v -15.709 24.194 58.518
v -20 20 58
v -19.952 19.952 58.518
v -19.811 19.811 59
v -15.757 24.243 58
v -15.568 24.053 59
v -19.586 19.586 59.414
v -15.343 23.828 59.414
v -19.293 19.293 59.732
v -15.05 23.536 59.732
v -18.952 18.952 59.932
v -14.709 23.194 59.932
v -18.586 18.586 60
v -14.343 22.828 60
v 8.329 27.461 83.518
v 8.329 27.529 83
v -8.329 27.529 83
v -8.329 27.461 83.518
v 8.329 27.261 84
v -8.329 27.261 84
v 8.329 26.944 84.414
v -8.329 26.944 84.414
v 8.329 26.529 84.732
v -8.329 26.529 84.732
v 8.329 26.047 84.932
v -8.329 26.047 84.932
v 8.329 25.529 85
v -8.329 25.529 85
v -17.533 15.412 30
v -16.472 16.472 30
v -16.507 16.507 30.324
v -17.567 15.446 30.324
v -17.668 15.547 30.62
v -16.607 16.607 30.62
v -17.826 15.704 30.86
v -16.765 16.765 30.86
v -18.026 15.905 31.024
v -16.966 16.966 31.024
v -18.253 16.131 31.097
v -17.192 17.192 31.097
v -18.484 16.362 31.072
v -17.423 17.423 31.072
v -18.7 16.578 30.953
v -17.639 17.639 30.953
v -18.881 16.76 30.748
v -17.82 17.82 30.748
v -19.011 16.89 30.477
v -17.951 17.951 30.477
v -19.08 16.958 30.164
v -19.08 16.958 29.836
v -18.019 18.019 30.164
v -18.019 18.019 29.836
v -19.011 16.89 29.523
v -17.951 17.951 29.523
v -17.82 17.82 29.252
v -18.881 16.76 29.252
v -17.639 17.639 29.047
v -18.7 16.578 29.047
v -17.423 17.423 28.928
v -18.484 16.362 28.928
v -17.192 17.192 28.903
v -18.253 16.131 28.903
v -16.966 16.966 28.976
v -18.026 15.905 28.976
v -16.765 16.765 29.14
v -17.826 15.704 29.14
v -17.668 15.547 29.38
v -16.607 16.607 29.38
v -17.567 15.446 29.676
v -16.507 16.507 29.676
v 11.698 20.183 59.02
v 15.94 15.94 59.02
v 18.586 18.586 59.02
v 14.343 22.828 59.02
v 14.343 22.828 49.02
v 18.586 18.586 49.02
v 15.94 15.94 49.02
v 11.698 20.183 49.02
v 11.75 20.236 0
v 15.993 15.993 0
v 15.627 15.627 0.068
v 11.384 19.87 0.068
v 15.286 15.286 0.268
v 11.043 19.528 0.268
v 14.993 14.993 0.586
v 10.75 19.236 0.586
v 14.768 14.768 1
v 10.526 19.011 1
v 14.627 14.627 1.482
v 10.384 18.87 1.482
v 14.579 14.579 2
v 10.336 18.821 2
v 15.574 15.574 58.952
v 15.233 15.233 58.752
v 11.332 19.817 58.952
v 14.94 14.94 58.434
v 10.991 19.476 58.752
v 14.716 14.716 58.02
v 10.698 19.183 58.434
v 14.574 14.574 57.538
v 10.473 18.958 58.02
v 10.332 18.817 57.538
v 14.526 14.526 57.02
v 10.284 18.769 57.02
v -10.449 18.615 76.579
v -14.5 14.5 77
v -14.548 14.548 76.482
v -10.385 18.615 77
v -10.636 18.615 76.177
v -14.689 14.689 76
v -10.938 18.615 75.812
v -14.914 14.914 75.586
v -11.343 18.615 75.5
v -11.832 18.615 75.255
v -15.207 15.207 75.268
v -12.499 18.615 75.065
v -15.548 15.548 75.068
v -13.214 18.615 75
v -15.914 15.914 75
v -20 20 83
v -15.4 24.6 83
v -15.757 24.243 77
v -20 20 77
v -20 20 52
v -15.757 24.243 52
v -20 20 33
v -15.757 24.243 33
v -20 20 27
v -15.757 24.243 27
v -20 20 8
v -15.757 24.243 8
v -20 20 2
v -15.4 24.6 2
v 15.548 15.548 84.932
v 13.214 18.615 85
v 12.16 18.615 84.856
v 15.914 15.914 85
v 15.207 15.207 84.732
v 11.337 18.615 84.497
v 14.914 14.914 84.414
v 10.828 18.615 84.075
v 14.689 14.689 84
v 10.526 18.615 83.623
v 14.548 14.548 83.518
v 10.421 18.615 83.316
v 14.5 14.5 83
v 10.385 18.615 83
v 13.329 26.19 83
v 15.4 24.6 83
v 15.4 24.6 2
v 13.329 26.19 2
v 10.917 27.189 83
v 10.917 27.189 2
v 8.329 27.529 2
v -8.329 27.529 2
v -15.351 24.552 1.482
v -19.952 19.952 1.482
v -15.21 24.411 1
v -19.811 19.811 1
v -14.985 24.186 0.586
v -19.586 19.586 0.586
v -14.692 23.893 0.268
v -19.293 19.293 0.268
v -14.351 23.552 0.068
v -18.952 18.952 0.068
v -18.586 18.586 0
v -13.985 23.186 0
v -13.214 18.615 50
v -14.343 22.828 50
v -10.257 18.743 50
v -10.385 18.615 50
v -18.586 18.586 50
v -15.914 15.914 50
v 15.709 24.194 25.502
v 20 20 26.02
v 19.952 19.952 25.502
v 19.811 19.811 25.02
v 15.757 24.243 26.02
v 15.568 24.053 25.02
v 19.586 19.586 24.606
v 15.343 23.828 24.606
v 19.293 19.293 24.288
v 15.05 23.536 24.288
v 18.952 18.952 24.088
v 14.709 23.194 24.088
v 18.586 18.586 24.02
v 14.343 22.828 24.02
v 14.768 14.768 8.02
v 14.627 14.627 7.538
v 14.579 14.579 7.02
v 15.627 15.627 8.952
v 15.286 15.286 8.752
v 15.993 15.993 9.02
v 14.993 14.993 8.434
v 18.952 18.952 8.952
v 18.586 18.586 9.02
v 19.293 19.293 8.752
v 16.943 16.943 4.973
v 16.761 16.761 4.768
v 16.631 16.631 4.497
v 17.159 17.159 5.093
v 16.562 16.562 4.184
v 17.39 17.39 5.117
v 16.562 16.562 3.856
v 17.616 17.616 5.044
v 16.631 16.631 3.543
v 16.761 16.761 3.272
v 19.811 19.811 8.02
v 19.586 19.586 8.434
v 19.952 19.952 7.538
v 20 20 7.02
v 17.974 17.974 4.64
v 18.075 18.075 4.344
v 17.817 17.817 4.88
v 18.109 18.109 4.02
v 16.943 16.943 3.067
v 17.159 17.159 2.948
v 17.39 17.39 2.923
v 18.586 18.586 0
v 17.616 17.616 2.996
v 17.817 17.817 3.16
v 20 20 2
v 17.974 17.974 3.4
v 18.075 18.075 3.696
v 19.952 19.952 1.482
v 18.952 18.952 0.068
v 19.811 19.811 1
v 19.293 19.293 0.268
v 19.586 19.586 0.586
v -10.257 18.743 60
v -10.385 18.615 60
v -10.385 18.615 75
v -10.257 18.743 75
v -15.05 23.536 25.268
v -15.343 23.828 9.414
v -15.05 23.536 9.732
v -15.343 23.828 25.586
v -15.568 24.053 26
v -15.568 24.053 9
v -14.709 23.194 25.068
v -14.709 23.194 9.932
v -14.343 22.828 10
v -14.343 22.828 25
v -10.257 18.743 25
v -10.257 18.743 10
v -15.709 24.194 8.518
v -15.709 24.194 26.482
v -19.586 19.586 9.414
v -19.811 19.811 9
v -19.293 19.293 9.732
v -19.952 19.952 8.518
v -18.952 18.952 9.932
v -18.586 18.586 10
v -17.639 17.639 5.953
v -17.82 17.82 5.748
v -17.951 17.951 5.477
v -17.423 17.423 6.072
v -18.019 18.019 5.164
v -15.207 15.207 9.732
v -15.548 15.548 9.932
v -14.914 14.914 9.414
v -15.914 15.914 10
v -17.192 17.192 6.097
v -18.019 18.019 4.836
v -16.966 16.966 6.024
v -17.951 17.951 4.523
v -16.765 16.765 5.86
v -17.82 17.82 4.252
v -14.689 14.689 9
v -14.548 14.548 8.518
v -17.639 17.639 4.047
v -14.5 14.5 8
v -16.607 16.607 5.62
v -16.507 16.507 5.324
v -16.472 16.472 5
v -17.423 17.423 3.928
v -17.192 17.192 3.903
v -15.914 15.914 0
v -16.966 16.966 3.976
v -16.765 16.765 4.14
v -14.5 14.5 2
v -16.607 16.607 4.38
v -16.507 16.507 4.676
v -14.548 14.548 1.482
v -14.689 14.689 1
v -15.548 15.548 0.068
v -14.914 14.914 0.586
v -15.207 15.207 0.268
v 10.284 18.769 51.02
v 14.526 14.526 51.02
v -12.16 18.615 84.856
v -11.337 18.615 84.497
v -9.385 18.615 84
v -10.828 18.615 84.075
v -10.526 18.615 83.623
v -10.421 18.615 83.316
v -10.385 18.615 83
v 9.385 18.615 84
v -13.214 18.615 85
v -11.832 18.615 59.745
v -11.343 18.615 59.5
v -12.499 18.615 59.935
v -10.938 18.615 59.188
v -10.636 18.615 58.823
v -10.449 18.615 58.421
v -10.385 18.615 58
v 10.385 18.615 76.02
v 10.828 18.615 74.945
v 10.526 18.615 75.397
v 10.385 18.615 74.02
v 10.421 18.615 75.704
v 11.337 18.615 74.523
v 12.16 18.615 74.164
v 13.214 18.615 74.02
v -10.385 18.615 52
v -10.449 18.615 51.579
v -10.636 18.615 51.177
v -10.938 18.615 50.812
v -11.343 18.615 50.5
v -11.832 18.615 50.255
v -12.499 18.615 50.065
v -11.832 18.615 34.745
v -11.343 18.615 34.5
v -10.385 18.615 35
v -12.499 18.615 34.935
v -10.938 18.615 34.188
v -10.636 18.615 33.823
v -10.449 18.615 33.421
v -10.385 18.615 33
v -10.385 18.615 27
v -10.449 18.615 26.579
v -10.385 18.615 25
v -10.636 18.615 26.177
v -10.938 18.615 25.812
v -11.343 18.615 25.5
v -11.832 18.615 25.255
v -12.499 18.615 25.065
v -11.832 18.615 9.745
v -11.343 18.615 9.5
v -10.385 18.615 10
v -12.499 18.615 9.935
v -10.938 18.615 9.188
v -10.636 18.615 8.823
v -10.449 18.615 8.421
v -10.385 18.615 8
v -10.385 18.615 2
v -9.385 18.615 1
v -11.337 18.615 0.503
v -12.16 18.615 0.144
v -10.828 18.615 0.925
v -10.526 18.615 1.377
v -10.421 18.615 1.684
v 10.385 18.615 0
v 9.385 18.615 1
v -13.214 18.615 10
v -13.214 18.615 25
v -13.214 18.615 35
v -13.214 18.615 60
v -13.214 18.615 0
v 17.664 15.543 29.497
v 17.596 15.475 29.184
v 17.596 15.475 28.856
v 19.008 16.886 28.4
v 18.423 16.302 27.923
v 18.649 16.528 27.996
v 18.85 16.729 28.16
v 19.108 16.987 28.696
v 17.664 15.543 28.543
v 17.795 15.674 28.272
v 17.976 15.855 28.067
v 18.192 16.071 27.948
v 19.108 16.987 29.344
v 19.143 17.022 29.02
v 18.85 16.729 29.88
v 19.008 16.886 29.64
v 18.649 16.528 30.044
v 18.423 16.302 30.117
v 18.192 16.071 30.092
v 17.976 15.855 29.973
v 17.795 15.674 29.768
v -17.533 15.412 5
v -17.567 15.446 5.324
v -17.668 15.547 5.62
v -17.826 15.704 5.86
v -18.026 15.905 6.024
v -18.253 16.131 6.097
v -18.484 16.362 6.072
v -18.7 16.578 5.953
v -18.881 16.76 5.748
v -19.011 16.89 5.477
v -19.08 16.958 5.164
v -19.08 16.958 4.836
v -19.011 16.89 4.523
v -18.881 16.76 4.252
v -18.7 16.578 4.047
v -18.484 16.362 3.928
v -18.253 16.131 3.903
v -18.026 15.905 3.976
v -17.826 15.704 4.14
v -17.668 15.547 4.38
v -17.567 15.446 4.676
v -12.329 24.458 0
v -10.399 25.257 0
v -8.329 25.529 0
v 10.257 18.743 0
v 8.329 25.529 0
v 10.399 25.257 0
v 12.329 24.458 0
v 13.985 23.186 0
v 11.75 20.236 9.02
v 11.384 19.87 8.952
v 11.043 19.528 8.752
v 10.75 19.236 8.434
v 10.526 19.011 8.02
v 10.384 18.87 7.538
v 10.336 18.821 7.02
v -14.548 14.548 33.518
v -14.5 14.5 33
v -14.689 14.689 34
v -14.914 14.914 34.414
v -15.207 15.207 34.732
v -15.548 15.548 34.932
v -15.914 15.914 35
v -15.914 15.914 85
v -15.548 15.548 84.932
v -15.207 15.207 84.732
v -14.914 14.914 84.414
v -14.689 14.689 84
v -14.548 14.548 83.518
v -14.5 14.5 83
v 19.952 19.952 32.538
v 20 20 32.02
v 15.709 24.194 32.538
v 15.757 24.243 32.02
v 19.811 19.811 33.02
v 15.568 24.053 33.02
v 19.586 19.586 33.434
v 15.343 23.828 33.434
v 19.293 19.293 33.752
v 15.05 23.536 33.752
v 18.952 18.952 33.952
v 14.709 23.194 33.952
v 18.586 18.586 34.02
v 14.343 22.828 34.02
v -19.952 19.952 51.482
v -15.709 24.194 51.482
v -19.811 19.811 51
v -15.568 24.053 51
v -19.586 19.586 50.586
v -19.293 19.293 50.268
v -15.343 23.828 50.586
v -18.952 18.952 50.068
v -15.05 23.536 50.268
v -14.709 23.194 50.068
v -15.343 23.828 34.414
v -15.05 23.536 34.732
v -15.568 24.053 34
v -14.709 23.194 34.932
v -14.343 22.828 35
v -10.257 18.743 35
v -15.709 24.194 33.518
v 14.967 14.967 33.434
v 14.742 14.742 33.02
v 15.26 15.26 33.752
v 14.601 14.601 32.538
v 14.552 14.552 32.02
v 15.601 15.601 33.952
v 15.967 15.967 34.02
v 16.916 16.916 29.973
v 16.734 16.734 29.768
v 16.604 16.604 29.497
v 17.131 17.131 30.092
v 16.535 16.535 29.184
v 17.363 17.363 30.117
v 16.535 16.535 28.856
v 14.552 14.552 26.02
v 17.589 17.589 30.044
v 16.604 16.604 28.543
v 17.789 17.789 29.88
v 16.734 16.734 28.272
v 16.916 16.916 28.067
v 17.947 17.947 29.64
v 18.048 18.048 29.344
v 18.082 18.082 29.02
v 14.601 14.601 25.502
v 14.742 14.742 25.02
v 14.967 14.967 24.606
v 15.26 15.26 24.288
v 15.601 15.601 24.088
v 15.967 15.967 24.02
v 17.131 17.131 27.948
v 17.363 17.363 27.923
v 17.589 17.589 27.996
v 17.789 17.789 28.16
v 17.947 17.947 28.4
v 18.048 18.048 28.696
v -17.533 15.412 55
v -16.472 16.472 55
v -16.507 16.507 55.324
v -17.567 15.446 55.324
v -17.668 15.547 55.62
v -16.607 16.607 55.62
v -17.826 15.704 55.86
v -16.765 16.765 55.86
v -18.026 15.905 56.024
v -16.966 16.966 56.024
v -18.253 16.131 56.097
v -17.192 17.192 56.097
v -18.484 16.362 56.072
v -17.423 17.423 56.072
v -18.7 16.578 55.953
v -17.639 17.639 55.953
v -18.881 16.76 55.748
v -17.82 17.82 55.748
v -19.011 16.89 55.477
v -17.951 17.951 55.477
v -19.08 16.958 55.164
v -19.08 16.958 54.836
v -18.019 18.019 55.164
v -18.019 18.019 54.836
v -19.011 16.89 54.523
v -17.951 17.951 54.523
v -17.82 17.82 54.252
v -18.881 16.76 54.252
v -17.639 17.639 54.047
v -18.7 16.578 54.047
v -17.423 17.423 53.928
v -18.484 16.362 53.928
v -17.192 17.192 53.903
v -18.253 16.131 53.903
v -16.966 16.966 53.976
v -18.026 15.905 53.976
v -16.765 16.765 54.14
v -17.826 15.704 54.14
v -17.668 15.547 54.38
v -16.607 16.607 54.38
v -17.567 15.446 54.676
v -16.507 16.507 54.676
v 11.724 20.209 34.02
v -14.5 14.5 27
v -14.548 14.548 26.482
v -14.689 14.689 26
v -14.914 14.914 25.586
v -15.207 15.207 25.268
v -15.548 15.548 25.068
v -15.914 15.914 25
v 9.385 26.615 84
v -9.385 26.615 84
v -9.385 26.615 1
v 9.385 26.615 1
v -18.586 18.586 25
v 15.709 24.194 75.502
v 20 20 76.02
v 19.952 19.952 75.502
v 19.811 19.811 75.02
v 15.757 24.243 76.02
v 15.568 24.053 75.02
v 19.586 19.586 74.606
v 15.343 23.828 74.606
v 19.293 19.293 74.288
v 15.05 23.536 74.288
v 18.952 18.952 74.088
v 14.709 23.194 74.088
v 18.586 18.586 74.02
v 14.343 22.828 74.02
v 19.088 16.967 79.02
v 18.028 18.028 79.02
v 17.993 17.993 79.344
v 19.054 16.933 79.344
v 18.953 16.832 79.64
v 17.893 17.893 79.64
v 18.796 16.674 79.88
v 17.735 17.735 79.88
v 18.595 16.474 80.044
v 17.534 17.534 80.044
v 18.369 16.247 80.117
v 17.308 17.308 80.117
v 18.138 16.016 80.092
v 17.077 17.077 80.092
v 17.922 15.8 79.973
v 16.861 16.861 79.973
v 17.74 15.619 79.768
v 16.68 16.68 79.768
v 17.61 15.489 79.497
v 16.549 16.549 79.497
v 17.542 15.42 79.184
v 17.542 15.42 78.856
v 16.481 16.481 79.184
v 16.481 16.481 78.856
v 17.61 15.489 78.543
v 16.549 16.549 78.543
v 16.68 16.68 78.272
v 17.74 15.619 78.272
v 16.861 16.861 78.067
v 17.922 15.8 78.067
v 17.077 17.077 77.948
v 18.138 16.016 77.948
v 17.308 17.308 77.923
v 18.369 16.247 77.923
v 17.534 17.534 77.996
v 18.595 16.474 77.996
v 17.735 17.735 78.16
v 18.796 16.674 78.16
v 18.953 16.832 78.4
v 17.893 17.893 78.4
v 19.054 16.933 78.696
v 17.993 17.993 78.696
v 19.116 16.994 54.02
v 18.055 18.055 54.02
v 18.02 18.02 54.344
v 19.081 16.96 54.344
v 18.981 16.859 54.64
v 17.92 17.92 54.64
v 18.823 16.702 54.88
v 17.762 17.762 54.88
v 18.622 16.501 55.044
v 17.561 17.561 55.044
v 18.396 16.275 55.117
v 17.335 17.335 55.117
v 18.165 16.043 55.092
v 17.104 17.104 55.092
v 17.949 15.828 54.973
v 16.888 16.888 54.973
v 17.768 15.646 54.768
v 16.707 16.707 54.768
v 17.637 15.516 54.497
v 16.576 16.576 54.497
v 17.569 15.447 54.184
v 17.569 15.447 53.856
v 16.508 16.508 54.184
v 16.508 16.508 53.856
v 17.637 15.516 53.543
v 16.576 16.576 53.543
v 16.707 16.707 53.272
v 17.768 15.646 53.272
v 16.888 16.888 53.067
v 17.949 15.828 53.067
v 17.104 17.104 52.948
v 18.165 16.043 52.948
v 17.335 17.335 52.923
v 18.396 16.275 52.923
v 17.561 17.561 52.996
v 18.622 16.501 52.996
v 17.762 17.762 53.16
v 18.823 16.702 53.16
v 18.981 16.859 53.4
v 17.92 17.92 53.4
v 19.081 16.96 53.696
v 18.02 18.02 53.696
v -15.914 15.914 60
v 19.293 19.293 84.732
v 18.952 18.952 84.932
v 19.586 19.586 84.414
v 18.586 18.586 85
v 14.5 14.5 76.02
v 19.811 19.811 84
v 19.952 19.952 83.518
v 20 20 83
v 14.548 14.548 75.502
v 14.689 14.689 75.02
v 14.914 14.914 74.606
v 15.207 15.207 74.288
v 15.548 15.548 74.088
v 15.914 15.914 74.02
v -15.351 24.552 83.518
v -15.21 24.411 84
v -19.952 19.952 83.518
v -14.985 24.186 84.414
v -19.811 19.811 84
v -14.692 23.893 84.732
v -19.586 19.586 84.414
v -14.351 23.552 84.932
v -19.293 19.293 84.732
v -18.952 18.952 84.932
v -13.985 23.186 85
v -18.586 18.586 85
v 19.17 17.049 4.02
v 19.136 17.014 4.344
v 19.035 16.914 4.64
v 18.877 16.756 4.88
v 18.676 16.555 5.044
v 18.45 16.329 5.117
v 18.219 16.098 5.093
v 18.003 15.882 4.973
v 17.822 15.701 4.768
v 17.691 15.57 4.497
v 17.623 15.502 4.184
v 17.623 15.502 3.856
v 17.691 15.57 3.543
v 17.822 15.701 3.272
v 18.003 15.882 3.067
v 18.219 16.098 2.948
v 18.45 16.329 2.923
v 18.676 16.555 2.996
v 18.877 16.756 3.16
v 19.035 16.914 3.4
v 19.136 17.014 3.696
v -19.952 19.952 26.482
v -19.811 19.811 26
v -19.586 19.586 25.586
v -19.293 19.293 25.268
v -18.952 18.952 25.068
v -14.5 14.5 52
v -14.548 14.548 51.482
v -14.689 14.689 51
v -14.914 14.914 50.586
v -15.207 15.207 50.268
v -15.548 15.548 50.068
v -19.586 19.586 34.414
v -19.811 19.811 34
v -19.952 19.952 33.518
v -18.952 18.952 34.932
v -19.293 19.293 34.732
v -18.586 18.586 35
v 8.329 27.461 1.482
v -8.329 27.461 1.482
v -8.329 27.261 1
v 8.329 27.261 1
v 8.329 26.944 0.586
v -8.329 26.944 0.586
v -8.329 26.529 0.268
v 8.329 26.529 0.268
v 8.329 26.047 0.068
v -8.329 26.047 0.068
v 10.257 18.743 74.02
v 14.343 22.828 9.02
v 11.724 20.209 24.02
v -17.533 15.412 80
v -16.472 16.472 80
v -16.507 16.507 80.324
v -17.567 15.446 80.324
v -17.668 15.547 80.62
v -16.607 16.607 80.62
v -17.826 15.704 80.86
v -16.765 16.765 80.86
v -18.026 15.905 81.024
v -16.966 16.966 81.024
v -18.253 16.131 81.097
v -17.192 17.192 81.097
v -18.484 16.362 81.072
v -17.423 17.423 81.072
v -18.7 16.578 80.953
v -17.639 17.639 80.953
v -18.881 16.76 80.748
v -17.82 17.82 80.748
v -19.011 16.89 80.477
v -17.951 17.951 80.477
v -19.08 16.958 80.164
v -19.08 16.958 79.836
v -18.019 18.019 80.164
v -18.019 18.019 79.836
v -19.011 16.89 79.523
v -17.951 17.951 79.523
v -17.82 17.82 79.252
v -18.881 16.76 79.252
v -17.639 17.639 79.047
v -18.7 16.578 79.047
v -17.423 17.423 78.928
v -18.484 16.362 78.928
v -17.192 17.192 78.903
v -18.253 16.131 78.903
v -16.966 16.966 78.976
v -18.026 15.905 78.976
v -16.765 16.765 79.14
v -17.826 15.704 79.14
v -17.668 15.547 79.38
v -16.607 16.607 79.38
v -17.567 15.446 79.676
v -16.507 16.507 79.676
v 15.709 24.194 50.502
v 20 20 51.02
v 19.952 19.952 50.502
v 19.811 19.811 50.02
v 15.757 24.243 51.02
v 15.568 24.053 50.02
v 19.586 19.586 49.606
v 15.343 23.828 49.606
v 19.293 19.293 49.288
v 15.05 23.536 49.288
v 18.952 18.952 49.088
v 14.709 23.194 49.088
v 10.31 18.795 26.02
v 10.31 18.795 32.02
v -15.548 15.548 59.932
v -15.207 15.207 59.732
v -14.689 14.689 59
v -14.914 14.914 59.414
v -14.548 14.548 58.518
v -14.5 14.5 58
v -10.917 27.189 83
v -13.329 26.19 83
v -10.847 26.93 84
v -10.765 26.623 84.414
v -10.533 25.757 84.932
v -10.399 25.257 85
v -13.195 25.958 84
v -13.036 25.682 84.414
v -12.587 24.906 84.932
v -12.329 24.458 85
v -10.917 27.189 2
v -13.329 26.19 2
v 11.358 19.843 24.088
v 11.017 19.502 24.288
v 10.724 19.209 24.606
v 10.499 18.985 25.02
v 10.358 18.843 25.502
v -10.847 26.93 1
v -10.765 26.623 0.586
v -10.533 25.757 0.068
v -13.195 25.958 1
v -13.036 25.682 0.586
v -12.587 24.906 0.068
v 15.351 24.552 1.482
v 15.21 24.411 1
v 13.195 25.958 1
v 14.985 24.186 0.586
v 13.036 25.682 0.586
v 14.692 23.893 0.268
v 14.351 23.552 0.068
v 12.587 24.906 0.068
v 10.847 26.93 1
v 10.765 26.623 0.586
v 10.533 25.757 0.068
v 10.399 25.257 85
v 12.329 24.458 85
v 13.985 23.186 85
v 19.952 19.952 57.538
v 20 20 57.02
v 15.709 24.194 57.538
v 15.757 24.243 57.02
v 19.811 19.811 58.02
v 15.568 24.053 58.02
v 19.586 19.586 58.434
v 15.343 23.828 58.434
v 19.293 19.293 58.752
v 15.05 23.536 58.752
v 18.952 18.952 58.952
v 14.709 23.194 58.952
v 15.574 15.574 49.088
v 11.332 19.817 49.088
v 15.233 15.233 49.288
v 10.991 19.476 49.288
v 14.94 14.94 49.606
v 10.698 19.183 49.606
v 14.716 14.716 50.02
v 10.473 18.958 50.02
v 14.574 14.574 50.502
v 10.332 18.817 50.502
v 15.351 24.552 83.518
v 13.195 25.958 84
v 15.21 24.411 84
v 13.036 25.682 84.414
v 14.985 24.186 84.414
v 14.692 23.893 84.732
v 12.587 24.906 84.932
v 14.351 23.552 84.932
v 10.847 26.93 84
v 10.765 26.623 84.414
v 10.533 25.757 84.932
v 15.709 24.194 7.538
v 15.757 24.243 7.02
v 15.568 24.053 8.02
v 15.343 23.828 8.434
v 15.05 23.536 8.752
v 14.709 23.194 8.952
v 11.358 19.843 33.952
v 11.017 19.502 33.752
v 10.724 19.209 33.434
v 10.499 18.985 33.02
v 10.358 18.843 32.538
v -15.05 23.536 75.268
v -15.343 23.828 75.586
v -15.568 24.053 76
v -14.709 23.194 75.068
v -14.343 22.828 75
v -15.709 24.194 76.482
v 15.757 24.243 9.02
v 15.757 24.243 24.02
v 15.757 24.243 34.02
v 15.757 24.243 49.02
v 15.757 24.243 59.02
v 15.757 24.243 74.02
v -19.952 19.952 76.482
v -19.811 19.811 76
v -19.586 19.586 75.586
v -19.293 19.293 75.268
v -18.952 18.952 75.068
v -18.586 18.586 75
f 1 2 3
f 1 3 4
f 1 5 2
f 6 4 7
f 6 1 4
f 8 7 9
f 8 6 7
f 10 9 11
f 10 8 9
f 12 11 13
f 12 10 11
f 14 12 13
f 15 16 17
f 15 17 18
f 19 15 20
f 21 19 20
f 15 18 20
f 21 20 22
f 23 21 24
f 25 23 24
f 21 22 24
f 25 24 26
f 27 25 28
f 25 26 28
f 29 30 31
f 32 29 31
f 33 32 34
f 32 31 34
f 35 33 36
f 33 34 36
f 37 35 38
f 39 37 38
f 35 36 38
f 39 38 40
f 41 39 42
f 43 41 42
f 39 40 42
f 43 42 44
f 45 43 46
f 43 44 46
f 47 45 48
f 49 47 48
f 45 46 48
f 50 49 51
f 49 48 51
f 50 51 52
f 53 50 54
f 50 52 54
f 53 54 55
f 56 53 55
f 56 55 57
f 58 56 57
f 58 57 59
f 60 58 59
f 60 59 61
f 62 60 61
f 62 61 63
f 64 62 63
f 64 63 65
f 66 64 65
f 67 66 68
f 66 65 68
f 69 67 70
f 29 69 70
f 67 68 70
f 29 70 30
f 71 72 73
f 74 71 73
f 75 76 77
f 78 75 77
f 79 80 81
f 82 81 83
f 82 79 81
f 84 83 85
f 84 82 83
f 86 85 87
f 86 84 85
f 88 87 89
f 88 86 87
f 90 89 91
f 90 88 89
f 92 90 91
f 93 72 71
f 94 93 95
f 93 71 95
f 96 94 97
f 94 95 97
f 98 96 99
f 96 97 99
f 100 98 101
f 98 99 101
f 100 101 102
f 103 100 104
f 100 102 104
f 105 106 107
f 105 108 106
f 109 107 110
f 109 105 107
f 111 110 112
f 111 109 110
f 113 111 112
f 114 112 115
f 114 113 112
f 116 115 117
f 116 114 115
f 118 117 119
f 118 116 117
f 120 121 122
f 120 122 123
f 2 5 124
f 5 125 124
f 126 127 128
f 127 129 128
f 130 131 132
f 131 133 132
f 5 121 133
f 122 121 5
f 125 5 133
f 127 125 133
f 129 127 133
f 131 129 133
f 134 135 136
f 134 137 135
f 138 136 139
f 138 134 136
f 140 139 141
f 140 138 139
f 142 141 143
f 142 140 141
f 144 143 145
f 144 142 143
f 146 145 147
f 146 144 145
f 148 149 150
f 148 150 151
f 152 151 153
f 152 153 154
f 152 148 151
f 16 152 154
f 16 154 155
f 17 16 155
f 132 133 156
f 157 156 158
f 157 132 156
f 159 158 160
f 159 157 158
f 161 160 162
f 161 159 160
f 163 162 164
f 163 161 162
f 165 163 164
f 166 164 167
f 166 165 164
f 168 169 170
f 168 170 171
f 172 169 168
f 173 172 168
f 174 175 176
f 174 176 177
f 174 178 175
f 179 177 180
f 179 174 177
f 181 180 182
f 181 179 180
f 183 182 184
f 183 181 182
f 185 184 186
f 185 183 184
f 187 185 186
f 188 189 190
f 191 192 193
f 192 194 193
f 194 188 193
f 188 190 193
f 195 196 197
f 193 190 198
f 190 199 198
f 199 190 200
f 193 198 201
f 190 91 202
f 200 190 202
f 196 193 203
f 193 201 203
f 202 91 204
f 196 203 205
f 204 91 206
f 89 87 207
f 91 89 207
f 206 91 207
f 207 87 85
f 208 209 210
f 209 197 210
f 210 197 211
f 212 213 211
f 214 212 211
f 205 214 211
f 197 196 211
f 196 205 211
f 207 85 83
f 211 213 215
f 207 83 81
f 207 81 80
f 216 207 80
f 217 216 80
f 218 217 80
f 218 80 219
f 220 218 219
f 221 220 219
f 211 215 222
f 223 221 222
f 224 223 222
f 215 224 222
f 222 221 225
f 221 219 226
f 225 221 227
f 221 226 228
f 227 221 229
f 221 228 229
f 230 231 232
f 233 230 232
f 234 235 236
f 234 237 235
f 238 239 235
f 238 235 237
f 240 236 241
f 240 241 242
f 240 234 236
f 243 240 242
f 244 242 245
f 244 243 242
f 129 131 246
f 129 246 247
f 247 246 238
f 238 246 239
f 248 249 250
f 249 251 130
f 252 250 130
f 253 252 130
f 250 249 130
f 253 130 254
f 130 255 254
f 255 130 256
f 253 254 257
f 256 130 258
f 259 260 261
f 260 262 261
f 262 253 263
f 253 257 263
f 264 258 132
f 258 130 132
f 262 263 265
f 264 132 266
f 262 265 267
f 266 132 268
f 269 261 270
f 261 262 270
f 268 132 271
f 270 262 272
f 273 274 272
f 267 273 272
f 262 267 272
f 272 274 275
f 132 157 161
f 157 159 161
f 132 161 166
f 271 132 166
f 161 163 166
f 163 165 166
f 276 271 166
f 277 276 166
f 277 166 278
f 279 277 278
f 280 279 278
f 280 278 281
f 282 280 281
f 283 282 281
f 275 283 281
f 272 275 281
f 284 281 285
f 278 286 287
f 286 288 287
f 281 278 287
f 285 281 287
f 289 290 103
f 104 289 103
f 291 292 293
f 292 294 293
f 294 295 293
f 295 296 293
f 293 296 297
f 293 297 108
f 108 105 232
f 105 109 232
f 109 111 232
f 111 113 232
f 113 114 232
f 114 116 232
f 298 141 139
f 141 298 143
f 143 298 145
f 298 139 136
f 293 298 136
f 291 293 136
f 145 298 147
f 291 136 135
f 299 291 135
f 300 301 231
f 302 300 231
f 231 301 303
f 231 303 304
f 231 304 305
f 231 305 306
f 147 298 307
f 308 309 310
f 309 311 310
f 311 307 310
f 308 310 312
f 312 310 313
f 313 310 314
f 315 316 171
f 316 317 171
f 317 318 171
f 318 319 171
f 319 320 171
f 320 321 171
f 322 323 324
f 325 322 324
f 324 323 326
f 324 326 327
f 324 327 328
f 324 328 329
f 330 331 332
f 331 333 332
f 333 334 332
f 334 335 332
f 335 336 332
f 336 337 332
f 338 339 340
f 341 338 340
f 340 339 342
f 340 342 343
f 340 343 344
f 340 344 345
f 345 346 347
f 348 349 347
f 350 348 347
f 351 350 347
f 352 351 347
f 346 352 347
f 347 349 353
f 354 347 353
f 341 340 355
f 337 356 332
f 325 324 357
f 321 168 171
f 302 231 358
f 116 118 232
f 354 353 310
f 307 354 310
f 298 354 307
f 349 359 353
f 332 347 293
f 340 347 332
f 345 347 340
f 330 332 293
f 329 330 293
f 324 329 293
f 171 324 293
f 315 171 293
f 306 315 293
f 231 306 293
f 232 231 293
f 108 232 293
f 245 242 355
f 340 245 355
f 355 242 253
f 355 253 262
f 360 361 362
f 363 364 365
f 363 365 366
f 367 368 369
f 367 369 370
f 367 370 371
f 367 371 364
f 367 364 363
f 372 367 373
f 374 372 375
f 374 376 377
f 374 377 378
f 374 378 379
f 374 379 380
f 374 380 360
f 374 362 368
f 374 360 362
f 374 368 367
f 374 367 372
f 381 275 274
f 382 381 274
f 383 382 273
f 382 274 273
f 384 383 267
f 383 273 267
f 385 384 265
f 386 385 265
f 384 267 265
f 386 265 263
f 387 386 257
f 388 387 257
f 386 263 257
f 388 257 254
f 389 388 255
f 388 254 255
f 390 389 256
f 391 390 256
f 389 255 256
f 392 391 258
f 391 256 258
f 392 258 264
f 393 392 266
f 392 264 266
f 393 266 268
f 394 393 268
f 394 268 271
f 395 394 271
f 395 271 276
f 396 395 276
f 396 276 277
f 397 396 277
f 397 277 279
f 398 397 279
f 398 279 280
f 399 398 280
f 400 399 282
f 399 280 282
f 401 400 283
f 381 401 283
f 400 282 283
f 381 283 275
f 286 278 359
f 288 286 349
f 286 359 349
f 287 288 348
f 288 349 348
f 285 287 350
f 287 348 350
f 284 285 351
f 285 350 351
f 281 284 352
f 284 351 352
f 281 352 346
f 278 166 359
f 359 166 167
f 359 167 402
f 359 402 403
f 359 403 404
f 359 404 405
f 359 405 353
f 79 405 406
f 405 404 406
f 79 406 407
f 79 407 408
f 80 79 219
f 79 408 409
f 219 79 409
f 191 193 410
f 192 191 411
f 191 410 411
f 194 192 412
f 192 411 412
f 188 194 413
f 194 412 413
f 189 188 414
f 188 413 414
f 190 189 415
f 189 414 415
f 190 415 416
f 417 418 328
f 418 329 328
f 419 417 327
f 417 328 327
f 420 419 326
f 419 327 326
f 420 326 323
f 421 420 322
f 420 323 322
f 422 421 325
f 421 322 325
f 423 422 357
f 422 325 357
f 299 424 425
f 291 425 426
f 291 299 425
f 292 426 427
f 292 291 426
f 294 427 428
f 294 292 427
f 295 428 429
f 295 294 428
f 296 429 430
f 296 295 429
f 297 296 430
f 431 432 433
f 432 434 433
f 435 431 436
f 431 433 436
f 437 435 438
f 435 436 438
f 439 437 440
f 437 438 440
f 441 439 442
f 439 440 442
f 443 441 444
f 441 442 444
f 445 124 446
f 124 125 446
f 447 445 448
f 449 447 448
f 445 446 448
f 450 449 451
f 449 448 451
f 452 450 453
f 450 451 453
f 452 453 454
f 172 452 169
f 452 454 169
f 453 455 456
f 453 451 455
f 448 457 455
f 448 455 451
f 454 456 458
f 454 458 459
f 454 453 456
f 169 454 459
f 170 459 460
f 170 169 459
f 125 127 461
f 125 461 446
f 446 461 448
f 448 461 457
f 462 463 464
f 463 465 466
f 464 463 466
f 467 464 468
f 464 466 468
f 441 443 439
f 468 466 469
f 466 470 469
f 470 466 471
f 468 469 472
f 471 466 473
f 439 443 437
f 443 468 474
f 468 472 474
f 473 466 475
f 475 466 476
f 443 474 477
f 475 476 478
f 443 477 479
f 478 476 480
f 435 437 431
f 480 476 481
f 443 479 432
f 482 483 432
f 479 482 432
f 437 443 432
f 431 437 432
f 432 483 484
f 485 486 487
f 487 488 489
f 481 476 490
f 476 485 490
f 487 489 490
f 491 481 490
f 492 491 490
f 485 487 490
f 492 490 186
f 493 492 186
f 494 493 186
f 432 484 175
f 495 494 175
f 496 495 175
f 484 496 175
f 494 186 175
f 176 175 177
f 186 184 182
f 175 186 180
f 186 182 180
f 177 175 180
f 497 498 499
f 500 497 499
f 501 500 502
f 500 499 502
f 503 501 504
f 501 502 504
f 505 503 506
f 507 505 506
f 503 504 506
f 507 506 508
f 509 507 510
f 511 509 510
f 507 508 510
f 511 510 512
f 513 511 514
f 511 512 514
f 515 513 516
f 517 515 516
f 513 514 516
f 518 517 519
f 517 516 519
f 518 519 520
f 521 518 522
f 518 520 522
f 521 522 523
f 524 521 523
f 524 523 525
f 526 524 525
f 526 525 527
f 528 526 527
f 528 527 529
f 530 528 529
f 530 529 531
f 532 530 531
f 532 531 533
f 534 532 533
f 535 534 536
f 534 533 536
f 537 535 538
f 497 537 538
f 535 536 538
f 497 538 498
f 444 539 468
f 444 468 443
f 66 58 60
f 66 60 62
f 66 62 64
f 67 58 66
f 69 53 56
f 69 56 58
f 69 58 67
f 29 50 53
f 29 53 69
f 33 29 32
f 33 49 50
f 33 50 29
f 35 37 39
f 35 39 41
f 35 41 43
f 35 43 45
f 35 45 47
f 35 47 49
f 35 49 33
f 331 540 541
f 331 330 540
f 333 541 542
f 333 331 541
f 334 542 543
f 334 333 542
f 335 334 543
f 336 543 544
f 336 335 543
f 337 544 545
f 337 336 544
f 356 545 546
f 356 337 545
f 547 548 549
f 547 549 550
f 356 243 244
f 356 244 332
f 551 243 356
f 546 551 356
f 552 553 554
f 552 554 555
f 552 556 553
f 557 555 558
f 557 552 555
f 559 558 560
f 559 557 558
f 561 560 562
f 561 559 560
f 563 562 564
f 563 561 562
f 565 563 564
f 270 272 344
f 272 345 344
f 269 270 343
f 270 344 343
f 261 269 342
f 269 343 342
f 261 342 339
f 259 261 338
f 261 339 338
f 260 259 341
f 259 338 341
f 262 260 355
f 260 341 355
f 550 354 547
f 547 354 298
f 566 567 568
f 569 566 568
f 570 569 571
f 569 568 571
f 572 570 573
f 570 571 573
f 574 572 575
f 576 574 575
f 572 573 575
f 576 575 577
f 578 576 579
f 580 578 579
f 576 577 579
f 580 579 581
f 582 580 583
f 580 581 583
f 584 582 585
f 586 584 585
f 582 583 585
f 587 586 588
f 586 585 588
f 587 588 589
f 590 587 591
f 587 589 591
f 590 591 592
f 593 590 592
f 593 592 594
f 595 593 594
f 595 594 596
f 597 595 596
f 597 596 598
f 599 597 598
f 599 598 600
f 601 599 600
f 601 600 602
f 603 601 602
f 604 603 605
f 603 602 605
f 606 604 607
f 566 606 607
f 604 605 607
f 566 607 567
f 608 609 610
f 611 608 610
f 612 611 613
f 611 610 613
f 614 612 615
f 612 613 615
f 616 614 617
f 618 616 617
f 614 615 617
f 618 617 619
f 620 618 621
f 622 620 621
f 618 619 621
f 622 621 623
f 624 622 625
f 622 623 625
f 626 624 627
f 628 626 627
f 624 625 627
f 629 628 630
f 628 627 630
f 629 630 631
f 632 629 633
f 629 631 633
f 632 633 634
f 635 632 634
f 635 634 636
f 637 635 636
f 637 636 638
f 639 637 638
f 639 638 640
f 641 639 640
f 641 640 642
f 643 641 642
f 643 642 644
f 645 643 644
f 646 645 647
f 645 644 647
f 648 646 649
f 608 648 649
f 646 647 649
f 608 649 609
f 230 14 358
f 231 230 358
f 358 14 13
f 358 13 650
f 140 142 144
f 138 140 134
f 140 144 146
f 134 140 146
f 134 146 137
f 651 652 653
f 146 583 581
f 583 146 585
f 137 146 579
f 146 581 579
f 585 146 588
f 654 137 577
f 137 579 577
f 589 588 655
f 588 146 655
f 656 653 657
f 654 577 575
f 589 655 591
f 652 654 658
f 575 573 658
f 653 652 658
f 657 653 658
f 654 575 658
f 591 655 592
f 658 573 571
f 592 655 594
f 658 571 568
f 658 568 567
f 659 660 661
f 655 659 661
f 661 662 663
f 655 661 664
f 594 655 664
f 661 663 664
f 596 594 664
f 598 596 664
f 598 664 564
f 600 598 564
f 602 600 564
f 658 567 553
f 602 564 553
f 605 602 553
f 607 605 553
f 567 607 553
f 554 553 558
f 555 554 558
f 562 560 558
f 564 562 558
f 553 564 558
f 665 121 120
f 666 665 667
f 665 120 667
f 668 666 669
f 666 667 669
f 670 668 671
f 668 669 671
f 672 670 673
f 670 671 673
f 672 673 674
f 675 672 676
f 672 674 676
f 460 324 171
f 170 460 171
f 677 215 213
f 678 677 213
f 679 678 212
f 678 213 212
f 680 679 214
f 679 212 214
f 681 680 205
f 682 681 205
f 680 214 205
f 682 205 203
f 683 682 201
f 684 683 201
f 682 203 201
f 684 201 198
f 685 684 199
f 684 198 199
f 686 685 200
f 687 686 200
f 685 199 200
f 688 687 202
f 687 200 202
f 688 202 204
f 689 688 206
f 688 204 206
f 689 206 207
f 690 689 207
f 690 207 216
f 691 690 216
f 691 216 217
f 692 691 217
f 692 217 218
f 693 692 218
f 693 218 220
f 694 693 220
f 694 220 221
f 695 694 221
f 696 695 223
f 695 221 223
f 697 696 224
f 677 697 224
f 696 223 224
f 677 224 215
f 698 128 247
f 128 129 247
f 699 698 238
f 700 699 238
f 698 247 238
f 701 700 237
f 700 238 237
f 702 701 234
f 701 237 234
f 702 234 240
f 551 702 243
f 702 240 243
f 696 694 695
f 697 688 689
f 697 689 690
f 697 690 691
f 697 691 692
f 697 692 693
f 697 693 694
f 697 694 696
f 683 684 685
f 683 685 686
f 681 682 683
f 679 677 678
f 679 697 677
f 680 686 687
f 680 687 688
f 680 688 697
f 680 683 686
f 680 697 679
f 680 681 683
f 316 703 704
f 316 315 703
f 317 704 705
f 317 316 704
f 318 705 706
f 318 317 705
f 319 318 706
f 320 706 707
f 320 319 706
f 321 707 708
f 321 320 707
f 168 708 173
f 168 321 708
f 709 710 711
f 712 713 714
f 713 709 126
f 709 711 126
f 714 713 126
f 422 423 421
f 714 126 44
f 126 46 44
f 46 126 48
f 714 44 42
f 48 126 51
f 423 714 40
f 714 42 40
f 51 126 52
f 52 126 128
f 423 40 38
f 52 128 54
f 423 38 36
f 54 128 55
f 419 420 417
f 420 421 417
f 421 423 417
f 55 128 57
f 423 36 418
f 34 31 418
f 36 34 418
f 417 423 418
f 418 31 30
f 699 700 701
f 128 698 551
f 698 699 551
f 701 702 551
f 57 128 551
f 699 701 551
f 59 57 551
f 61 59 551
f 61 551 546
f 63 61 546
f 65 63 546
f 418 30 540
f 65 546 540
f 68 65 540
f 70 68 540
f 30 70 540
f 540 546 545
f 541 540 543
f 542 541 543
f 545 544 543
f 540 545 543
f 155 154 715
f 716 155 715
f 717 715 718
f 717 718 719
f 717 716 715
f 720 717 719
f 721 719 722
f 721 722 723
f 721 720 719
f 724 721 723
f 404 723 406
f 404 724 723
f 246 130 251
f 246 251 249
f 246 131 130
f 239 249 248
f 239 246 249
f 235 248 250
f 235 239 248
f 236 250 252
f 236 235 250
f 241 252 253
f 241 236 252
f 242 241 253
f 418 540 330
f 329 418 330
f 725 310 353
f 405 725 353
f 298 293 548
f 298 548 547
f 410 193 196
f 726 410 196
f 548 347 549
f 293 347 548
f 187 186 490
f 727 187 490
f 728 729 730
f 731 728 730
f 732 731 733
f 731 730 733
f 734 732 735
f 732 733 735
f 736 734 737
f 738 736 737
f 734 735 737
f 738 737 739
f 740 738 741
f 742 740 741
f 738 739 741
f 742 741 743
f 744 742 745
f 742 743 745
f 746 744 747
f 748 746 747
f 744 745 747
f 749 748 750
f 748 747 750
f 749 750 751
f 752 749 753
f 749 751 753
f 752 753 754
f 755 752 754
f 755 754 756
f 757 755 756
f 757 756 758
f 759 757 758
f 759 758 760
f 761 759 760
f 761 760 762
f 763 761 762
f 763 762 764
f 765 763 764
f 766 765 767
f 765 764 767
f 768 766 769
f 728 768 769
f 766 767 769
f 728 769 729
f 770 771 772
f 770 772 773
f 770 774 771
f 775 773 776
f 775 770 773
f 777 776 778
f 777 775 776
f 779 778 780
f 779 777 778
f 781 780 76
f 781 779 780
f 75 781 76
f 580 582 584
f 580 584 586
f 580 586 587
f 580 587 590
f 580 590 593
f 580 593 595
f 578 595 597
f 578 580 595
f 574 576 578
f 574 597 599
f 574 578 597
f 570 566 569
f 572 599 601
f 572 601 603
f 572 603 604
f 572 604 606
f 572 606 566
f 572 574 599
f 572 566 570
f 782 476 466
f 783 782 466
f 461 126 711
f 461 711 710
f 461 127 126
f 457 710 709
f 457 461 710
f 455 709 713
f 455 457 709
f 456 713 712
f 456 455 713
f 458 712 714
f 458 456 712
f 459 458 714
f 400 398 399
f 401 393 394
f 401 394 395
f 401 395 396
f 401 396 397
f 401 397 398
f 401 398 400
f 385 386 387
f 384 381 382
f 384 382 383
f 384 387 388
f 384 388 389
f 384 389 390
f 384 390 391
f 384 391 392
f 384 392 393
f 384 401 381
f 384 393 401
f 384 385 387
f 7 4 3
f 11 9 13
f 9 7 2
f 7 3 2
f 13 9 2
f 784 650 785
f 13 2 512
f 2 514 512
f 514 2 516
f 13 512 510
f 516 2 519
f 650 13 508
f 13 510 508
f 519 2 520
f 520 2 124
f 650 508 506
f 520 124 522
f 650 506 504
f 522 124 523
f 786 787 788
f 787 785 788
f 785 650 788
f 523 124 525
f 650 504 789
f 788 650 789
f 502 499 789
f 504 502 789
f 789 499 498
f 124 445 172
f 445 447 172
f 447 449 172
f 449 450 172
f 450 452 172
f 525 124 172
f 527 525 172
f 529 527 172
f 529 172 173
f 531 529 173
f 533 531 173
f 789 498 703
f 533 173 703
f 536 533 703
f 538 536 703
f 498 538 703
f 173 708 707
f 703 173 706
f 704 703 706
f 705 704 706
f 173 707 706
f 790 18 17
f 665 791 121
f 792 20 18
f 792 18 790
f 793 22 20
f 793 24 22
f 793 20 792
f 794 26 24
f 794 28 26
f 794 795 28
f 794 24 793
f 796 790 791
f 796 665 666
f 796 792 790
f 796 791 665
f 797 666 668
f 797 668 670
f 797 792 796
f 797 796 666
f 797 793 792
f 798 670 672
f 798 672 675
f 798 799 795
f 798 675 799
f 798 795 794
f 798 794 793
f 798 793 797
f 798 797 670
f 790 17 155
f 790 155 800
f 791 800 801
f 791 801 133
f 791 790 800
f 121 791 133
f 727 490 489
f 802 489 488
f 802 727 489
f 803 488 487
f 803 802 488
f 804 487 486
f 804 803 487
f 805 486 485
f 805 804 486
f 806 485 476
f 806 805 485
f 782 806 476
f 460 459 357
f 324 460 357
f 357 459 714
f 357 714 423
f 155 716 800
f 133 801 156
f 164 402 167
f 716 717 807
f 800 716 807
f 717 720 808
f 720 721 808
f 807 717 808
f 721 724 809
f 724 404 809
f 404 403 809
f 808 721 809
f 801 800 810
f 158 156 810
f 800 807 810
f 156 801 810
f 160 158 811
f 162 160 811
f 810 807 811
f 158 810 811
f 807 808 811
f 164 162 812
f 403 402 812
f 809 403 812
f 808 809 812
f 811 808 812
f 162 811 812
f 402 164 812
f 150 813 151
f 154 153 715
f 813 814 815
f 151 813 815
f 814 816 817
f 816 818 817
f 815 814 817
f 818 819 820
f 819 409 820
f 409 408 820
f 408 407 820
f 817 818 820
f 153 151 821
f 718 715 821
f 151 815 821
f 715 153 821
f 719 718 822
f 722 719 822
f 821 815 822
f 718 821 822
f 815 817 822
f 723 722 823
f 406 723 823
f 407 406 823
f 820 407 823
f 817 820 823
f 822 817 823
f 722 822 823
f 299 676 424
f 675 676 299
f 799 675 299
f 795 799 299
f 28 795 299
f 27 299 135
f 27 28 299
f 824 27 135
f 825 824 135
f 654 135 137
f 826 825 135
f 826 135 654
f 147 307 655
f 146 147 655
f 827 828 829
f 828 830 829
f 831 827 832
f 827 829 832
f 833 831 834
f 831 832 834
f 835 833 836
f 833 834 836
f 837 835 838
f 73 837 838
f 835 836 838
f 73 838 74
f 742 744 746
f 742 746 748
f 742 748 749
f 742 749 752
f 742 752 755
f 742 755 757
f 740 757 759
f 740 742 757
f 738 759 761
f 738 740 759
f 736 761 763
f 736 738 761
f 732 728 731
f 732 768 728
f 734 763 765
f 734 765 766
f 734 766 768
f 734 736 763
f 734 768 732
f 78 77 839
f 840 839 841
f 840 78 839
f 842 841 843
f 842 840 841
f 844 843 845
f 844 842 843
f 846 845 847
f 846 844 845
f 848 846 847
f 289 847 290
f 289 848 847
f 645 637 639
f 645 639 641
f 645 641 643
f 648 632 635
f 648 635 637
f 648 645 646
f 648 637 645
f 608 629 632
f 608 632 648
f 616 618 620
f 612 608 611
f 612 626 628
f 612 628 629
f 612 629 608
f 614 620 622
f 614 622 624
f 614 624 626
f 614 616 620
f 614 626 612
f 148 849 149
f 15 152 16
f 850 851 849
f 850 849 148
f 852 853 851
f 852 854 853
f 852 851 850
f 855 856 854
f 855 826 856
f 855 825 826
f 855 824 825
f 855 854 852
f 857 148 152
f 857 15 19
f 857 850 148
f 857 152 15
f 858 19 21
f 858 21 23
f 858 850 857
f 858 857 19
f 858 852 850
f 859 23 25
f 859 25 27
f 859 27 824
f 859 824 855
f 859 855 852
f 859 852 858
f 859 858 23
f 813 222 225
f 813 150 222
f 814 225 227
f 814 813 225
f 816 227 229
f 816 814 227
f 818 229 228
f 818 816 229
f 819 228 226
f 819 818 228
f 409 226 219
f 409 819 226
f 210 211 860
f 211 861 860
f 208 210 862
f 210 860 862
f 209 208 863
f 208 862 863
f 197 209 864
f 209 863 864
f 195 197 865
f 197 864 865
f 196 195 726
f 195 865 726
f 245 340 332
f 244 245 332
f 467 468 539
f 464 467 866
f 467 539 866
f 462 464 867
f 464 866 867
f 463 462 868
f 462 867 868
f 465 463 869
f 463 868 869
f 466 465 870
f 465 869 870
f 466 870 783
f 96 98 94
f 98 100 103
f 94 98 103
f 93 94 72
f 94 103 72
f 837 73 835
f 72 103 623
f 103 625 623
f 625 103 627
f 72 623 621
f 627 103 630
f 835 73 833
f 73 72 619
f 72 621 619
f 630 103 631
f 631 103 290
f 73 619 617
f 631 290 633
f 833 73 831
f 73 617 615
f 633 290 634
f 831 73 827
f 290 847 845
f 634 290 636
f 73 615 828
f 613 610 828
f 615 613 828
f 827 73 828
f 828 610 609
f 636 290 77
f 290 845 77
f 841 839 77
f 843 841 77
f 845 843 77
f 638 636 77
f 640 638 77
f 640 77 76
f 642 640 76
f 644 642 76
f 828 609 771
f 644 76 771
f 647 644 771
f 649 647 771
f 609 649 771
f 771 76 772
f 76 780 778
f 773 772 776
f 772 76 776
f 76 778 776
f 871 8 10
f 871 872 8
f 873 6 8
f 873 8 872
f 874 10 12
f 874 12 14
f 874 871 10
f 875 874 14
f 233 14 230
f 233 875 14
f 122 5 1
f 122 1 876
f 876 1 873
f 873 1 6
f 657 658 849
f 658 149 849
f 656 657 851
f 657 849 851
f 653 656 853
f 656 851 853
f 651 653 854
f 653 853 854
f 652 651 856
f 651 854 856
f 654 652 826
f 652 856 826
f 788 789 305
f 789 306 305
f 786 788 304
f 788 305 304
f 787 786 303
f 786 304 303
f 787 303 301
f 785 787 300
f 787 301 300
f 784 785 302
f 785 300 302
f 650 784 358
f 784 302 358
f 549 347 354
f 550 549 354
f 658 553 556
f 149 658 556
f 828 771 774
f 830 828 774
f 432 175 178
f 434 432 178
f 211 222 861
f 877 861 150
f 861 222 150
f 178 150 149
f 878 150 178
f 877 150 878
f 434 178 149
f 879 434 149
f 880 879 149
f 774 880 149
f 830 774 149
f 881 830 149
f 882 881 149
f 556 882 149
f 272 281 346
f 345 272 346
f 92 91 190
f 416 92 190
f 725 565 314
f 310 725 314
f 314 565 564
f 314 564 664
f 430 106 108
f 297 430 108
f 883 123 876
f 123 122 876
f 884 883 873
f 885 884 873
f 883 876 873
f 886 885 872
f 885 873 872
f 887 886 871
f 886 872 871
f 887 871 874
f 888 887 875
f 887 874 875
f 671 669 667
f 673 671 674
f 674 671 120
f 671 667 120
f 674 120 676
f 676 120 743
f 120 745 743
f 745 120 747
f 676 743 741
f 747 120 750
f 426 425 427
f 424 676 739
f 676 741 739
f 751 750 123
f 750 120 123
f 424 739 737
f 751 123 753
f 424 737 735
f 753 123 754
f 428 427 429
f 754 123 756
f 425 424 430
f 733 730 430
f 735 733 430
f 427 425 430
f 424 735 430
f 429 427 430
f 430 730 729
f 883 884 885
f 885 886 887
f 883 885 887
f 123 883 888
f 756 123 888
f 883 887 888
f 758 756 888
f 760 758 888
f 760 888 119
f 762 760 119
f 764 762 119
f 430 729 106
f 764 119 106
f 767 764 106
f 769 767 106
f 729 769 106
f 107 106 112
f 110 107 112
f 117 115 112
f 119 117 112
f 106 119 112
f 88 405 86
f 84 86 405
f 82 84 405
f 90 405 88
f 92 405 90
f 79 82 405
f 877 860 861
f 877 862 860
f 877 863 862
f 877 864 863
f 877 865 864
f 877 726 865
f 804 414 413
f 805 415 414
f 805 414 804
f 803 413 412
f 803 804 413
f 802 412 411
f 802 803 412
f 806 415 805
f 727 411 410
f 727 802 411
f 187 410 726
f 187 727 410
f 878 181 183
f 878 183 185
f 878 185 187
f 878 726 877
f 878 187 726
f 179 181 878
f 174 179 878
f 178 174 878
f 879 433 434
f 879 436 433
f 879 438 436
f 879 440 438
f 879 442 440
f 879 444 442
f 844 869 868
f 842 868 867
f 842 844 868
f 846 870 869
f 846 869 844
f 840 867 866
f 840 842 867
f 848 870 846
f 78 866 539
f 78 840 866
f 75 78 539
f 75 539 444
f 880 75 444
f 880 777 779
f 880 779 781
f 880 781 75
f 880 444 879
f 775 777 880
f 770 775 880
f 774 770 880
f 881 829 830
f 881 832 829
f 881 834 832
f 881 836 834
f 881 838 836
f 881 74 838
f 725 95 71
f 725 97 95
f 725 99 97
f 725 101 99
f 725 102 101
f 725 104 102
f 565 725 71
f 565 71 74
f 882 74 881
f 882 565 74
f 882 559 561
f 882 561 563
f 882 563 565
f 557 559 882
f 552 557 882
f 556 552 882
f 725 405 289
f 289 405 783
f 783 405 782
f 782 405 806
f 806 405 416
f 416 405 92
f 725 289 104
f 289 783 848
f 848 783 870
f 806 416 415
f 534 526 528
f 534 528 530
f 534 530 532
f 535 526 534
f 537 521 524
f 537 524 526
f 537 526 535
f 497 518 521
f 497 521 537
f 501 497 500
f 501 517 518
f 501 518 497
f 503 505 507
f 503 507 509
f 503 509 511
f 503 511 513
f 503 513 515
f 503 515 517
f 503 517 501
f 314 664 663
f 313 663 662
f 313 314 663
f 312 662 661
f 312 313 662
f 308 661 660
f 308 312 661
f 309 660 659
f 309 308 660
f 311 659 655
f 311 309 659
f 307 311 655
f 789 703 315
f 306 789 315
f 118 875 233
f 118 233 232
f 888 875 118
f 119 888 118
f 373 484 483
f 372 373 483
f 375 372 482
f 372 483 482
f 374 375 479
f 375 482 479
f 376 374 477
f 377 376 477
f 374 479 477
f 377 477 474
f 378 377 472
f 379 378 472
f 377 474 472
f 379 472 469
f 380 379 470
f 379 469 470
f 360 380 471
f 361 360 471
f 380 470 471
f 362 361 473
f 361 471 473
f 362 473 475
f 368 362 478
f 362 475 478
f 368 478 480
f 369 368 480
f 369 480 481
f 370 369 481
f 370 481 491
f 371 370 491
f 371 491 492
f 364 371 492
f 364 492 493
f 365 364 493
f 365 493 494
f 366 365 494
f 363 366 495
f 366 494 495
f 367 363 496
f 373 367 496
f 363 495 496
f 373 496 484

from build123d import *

# Parameters (mm, degrees)
F1_DEPTH  = 85
F2_R      = 10
F4_DEPTH  = 6
F5_R      = 2
F6_W      = 7.7781745931
F6_H      = 15
F7_DEPTH  = 6
F8_R      = 2
F6_R      = 1.1
F9_DEPTH  = 1.5
F3_R      = 1.1
F10_DEPTH = 1.5
F11_W     = 18.7703792453
F11_H     = 83
F12_DEPTH = 8


with BuildPart() as f1:
    # F0 (on Top) → F1 (new body)
    with BuildSketch(Plane.XY):
        Polygon((-20, 20), (-14.5, 14.5), (-10.3851896226, 18.6148103774), (0, 18.6148103774), (10.3851896226, 18.6148103774), (14.5, 14.5), (20, 20), (12.470660899, 27.529339101), (0, 27.529339101), (-12.470660899, 27.529339101), align=None)
    extrude(amount=F1_DEPTH)

    # F2
    f2_edges = [f1.edges().sort_by_distance(p)[0] for p in [
        (-12.470661, 27.529339, 42.5),
        (12.470661, 27.529339, 42.5),
    ]]
    fillet(f2_edges, radius=F2_R)

    # F3 (on face) → F4 (cut)
    with BuildSketch(Plane(origin=(0, 0, 0), x_dir=(0.7071067812, 0.7071067812, 0), z_dir=(0.7071067812, -0.7071067812, 0))):
        Polygon((28.2842712475, 59.0200200677), (28.2842712475, 74.0199925453), (20.5060966544, 74.0199925453), (20.5060966544, 0), (20.6173848753, 0), (20.6173848753, 9.0200751125), (28.2842712475, 9.0200751125), (28.2842712475, 24.0200475901), (20.5802888017, 24.0200475901), (20.5802888017, 34.0200475901), (28.2842712475, 34.0200475901), (28.2842712475, 49.0200200677), (20.543192728, 49.0200200677), (20.543192728, 59.0200200677), align=None)
    extrude(amount=-F4_DEPTH, mode=Mode.SUBTRACT)

    # F5
    f5_edges = [f1.edges().sort_by_distance(p)[0] for p in [
        (17.87868, 22.12132, 74.019993),
        (17.87868, 22.12132, 49.02002),
        (17.87868, 22.12132, 24.020048),
        (17.699797, 22.300203, 0),
        (12.457372, 16.700013, 0),
        (12.431141, 16.673782, 24.020048),
        (12.404911, 16.647551, 49.02002),
        (17.699797, 22.300203, 85),
        (12.442595, 16.557405, 85),
        (17.87868, 22.12132, 59.02002),
        (12.404911, 16.647551, 59.02002),
        (17.87868, 22.12132, 34.020048),
        (12.431141, 16.673782, 34.020048),
        (17.87868, 22.12132, 9.020075),
        (12.457372, 16.700013, 9.020075),
        (-17.699797, 22.300203, 0),
        (-17.699797, 22.300203, 85),
        (-12.15536, 26.768134, 0),
        (0, 27.529339, 0),
        (12.15536, 26.768134, 0),
        (-12.442595, 16.557405, 0),
        (-12.15536, 26.768134, 85),
        (0, 27.529339, 85),
        (-12.442595, 16.557405, 85),
        (12.15536, 26.768134, 85),
        (12.442595, 16.557405, 74.019993),
    ]]
    fillet(f5_edges, radius=F5_R)

    # F6 (on face) → F7 (cut)
    with BuildSketch(Plane(origin=(0, 0, 0), x_dir=(0.7071067812, -0.7071067812, 0), z_dir=(-0.7071067812, -0.7071067812, 0))):
        with Locations((-24.3951839509, 17.5)):
            Rectangle(F6_W, F6_H)
        with Locations((-24.3951839509, 42.5)):
            Rectangle(F6_W, F6_H)
        with Locations((-24.3951839509, 67.5)):
            Rectangle(F6_W, F6_H)
    extrude(amount=-F7_DEPTH, mode=Mode.SUBTRACT)

    # F8
    f8_edges = [f1.edges().sort_by_distance(p)[0] for p in [
        (-17.87868, 22.12132, 35),
        (-17.87868, 22.12132, 50),
        (-17.87868, 22.12132, 60),
        (-17.87868, 22.12132, 75),
        (-12.442595, 16.557405, 75),
        (-12.442595, 16.557405, 60),
        (-12.442595, 16.557405, 50),
        (-12.442595, 16.557405, 35),
        (-12.442595, 16.557405, 25),
        (-12.442595, 16.557405, 10),
        (-17.87868, 22.12132, 10),
        (-17.87868, 22.12132, 25),
    ]]
    fillet(f8_edges, radius=F8_R)

    # F6 (on face) → F9 (join)
    with BuildSketch(Plane(origin=(0, 0, 0), x_dir=(0.7071067812, -0.7071067812, 0), z_dir=(-0.7071067812, -0.7071067812, 0))):
        with Locations((-24.3951839509, 5)):
            Circle(F6_R)
        with Locations((-24.3951839509, 30)):
            Circle(F6_R)
        with Locations((-24.3951839509, 55)):
            Circle(F6_R)
        with Locations((-24.3951839509, 80)):
            Circle(F6_R)
    extrude(amount=F9_DEPTH)

    # F3 (on face) → F10 (join)
    with BuildSketch(Plane(origin=(0, 0, 0), x_dir=(0.7071067812, 0.7071067812, 0), z_dir=(0.7071067812, -0.7071067812, 0))):
        with Locations((24.3951839509, 79.0199925453)):
            Circle(F3_R)
        with Locations((24.4336626312, 54.0200221575)):
            Circle(F3_R)
        with Locations((24.4721413114, 29.0200517697)):
            Circle(F3_R)
        with Locations((24.5106199916, 4.0200813819)):
            Circle(F3_R)
    extrude(amount=F10_DEPTH)

    # F11 (on face) → F12 (cut)
    with BuildSketch(Plane.XZ.offset(-18.6148103774)):
        with Locations((0, 42.5)):
            Rectangle(F11_W, F11_H)
    extrude(amount=-F12_DEPTH, mode=Mode.SUBTRACT)


solid = f1.part
